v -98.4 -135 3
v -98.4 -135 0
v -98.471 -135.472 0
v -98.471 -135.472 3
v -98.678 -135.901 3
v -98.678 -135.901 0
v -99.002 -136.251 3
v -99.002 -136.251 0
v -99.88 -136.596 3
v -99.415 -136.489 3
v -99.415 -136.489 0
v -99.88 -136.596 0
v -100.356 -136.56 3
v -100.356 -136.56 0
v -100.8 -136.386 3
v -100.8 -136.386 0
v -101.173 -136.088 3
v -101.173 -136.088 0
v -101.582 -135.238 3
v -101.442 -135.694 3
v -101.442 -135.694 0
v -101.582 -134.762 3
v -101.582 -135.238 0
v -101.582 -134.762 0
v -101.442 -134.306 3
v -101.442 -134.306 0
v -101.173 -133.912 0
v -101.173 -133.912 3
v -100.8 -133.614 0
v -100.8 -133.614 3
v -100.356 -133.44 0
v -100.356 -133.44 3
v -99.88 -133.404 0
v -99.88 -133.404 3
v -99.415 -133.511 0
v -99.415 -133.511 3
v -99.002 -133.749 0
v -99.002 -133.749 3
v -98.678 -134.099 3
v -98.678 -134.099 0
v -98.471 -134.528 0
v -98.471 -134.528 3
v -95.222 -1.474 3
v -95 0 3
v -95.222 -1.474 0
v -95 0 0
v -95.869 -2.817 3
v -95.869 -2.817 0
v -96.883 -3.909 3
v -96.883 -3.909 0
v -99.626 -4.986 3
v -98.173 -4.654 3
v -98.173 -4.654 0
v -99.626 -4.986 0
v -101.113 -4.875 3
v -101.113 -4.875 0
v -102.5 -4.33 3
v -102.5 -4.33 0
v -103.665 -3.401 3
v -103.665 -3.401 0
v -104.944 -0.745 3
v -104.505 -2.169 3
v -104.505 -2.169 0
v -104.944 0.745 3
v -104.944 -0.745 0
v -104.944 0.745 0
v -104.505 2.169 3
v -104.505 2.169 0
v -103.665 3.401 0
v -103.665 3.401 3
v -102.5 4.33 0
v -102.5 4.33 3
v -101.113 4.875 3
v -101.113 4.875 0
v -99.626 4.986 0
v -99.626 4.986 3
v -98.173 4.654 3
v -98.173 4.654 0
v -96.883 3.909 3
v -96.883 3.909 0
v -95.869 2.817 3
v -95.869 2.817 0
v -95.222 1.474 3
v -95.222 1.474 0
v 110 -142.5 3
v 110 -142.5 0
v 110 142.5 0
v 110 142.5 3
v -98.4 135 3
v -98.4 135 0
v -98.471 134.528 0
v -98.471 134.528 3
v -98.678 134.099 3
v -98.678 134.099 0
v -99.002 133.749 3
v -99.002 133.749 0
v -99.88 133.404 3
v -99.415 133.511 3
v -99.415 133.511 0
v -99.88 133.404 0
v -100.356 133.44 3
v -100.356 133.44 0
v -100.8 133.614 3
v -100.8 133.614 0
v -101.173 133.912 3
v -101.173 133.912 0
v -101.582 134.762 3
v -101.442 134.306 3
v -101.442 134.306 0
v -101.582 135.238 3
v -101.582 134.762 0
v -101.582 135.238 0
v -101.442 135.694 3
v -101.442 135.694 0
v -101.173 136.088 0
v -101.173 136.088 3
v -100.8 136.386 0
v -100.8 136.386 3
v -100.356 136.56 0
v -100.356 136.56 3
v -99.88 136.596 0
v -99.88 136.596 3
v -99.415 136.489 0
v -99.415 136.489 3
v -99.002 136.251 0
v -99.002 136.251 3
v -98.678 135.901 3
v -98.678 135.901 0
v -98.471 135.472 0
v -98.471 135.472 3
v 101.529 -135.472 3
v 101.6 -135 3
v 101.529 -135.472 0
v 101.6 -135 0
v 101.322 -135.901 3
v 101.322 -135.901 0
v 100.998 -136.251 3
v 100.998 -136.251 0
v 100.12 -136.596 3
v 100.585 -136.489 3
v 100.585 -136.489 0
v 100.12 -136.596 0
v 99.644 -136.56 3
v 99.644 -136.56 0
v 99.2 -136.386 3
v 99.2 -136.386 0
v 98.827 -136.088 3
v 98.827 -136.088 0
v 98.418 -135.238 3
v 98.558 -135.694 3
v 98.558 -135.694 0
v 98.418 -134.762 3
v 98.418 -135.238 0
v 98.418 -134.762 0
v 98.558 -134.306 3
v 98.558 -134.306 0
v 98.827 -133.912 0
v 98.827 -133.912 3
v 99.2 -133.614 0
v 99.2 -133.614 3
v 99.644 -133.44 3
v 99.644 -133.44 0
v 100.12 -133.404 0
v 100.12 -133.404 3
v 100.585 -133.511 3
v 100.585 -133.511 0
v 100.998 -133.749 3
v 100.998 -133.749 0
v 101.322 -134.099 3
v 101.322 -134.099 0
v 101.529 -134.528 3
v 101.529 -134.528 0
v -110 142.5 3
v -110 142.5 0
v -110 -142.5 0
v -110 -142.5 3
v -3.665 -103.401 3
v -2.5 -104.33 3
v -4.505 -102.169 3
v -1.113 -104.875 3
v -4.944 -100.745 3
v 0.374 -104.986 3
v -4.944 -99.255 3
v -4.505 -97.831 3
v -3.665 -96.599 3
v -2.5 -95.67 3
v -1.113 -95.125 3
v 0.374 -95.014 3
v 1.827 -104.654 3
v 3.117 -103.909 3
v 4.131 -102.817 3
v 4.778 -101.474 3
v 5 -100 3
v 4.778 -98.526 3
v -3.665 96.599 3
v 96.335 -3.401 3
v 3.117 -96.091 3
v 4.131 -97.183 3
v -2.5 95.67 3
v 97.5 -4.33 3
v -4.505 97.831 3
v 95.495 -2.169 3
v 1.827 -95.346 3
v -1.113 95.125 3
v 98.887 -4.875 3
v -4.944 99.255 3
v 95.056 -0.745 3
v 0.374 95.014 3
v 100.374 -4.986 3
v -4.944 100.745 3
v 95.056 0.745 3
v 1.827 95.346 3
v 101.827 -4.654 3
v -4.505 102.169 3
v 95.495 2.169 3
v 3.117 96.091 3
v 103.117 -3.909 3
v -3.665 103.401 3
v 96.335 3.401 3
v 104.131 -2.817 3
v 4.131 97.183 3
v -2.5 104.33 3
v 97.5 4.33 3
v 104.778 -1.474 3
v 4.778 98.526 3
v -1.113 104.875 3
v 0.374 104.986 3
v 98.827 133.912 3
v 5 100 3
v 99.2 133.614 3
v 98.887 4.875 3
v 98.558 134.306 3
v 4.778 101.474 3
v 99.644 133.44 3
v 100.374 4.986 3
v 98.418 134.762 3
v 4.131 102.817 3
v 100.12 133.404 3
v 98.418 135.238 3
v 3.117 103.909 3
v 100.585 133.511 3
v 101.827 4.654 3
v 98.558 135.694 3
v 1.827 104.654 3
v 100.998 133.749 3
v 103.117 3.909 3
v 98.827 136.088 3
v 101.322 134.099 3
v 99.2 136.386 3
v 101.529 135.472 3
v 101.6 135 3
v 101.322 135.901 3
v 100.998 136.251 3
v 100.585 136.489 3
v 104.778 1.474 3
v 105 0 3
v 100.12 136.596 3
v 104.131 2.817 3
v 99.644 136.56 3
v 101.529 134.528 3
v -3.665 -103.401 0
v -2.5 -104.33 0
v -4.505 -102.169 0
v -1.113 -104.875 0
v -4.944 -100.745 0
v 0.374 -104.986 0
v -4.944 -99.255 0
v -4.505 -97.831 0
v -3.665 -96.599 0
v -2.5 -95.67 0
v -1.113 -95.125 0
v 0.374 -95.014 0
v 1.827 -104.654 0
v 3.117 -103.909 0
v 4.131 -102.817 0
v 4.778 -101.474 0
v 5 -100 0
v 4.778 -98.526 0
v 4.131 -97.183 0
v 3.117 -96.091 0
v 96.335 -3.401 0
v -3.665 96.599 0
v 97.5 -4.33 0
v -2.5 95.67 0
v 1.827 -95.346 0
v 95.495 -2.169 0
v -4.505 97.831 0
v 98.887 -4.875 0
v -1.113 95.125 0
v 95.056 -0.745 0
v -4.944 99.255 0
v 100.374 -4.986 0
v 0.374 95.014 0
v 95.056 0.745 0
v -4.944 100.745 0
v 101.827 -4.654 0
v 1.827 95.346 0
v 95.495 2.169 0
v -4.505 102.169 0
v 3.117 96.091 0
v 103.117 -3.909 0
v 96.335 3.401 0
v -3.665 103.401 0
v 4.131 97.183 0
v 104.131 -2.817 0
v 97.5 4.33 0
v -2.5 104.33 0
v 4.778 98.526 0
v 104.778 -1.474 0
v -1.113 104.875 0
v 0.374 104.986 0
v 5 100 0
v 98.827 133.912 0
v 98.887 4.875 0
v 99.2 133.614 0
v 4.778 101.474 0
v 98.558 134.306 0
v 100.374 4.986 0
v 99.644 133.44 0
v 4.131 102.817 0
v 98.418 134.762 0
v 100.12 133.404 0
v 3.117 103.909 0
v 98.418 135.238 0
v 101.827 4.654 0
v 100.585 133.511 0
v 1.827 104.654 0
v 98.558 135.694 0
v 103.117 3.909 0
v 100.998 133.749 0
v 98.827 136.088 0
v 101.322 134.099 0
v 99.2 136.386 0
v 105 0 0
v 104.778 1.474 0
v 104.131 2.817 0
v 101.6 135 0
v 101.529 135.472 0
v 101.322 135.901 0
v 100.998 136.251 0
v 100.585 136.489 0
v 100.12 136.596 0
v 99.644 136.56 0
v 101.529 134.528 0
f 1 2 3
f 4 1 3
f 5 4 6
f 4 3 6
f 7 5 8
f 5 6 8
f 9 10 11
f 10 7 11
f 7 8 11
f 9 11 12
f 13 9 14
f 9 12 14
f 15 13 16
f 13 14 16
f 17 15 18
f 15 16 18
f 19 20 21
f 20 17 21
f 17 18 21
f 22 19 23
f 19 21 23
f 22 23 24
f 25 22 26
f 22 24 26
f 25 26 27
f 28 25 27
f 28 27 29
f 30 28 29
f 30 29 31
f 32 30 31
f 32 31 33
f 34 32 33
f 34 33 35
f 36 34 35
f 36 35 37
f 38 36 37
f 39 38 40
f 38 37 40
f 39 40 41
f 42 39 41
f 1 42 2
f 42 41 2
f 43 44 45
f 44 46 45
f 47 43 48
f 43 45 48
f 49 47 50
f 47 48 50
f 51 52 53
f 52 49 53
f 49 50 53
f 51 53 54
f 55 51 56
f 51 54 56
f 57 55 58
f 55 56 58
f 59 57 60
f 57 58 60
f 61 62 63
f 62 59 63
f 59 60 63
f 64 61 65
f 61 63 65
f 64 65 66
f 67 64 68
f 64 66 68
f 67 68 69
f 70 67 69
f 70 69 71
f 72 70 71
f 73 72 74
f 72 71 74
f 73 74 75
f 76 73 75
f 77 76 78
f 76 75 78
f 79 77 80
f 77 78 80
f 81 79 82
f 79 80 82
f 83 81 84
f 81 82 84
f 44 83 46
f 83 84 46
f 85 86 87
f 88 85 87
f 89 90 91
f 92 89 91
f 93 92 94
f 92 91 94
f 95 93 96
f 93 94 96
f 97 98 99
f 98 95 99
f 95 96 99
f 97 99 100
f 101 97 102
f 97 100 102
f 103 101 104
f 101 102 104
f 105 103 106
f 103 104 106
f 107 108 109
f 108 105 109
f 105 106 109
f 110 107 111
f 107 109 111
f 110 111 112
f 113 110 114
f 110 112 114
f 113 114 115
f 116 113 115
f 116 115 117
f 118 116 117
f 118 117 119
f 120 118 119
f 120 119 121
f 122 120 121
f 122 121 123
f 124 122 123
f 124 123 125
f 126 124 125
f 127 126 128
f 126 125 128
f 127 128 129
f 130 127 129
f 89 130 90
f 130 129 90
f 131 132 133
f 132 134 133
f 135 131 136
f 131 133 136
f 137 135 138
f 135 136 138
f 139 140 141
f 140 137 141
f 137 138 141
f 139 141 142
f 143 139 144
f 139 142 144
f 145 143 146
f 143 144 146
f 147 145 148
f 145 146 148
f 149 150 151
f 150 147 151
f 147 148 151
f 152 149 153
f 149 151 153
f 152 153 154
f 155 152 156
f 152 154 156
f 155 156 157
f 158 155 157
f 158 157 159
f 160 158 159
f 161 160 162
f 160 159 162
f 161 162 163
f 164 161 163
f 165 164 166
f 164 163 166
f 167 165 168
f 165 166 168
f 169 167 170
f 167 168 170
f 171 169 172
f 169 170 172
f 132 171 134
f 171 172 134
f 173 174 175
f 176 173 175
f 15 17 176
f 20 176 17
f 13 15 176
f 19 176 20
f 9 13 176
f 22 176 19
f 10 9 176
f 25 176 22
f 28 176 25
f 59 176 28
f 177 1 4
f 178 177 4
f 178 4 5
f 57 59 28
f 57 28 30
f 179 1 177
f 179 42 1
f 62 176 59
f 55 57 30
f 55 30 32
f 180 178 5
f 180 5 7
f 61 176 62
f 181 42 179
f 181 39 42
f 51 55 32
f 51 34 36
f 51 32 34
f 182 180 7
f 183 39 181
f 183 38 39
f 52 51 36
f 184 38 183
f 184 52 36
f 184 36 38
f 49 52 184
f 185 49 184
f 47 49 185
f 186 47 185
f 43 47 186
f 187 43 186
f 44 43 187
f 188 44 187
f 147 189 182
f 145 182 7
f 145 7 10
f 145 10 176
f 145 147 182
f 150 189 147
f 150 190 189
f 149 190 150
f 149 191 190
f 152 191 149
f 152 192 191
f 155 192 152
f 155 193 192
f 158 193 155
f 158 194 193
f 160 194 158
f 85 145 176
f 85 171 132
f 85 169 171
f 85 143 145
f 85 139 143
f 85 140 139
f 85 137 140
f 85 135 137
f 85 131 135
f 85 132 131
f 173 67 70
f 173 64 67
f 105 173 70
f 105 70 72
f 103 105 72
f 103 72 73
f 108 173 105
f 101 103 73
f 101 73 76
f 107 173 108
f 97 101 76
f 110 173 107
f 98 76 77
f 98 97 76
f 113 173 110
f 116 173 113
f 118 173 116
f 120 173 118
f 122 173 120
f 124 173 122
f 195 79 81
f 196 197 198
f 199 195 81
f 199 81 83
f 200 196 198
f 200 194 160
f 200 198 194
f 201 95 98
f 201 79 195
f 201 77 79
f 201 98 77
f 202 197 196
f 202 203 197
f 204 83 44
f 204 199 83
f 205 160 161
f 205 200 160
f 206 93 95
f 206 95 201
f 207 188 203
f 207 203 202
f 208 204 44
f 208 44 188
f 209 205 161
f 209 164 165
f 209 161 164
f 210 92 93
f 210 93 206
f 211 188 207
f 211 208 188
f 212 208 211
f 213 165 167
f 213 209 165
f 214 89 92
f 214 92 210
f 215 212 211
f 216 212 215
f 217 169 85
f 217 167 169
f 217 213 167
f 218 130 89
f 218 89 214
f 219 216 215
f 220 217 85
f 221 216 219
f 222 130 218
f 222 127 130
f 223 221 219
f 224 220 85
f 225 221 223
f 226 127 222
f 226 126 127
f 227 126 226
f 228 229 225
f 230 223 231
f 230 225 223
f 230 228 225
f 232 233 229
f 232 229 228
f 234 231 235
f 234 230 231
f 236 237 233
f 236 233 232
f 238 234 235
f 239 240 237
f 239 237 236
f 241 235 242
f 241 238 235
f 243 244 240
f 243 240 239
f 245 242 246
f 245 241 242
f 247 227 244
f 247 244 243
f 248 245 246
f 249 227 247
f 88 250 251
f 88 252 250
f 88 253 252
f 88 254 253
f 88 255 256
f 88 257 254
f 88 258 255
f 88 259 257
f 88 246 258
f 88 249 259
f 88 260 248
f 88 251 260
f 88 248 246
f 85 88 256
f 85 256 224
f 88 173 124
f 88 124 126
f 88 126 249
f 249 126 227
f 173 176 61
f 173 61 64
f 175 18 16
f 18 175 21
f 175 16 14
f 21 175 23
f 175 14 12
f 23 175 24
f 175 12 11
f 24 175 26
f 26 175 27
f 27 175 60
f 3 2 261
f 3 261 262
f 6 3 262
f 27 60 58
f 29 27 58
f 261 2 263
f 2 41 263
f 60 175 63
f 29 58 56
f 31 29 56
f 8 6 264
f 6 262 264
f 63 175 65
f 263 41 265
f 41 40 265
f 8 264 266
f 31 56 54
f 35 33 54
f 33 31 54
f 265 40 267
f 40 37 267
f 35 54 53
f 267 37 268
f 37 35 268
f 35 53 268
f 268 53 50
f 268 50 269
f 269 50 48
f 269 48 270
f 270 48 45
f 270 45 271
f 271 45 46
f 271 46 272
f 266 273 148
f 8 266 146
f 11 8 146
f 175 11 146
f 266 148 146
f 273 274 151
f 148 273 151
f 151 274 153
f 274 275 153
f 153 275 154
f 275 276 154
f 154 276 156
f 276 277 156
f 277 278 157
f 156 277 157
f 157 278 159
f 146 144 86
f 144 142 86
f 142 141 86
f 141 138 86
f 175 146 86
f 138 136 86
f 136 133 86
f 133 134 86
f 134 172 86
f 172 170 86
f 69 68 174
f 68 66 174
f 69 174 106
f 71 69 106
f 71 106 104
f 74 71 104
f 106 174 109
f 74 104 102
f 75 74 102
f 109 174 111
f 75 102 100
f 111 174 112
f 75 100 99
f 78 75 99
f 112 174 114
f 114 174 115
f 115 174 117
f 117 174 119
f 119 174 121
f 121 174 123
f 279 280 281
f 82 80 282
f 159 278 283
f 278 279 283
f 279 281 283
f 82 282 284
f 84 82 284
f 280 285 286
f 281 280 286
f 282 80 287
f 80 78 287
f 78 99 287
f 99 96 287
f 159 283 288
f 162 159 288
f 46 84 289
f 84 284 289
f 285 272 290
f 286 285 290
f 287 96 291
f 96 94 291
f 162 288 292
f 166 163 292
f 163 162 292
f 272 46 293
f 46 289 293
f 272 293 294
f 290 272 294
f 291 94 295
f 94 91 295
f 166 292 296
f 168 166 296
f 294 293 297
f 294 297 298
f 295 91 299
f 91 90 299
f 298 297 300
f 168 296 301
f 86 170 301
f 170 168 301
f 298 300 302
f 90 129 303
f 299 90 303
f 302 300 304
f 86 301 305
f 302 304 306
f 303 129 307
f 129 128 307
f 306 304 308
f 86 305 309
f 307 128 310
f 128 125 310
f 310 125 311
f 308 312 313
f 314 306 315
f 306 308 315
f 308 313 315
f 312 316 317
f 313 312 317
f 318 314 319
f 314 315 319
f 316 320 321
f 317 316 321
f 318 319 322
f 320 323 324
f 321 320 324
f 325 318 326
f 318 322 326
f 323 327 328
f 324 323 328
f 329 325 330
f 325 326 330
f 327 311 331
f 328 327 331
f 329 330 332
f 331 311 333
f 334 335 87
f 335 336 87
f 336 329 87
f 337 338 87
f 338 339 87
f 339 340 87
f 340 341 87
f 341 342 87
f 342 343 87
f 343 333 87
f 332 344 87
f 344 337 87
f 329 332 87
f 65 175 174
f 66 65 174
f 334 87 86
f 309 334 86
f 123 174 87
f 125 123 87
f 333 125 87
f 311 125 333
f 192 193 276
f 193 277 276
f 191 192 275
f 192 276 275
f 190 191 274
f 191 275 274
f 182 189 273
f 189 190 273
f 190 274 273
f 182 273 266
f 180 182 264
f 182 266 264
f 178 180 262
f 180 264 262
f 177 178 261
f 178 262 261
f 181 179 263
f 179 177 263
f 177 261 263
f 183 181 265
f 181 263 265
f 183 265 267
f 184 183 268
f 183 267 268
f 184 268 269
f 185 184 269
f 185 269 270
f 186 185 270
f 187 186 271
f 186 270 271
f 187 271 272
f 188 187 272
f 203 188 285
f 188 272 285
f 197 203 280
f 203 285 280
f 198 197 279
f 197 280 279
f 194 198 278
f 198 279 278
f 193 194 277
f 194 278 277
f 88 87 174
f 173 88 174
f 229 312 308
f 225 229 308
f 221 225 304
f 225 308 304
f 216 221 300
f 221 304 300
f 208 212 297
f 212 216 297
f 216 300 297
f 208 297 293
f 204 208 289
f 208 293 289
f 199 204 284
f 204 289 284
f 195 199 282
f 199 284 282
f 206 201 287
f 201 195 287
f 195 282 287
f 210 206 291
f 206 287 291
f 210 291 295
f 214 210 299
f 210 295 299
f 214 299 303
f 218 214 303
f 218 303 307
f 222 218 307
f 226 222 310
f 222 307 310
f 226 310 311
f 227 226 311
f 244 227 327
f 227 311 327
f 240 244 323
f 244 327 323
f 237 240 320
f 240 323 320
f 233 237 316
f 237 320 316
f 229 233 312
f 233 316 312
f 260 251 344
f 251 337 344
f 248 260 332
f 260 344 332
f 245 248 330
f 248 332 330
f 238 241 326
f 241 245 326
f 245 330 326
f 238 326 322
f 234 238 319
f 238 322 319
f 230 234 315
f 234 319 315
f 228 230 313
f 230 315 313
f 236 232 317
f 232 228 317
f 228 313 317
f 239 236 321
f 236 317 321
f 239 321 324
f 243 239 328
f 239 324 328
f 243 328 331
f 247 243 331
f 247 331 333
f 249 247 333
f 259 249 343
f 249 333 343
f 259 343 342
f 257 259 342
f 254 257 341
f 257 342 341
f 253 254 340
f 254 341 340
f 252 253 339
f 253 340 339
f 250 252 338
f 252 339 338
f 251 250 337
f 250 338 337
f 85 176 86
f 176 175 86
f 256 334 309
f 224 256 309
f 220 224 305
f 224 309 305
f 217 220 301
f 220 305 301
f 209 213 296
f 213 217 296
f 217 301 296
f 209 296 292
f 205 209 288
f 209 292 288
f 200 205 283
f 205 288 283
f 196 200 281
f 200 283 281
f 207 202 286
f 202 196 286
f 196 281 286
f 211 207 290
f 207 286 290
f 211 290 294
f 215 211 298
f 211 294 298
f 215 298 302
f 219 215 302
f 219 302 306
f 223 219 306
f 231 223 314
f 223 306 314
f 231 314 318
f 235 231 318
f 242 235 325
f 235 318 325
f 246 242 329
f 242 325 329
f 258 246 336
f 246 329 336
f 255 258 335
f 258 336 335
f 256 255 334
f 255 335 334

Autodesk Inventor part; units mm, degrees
ref_plane "YZ Plane" through (0, 0, 0) normal (1, 0, 0) x (0, 1, 0)
ref_plane "XZ Plane" through (0, 0, 0) normal (0, 1, 0) x (-1, 0, 0)
ref_plane "XY Plane" through (0, 0, 0) normal (0, 0, 1) x (1, 0, 0)
sketch "スケッチ1" plane through (0, 0, 0) normal (0, 0, 1) x (1, 0, 0)
  line L0 (0, 100) -> (-100, 0) construction
  line L1 (-100, 0) -> (0, -100) construction
  line L2 (0, -100) -> (100, 0) construction
  line L3 (100, 0) -> (0, 100) construction
  line L4 (0, 100) -> (0, -100) construction
  line L5 (-100, 0) -> (100, 0) construction
  line L6 (100, 135) -> (-100, 135) construction
  line L7 (-100, 135) -> (-100, -135) construction
  line L8 (-100, -135) -> (100, -135) construction
  line L9 (100, -135) -> (100, 135) construction
  line L10 (100, 135) -> (-100, -135) construction
  line L11 (-100, 135) -> (100, -135) construction
  circle A0 centre (-100, 135) radius 1.6
  circle A1 centre (100, 135) radius 1.6
  circle A2 centre (100, -135) radius 1.6
  circle A3 centre (-100, -135) radius 1.6
  circle A4 centre (-100, 0) radius 5
  circle A5 centre (0, 100) radius 5
  circle A6 centre (100, 0) radius 5
  circle A7 centre (0, -100) radius 5
  line L12 (110, 142.5) -> (-110, 142.5)
  line L13 (-110, 142.5) -> (-110, -142.5)
  line L14 (-110, -142.5) -> (110, -142.5)
  line L15 (110, -142.5) -> (110, 142.5)
  line L16 (110, 142.5) -> (-110, -142.5) construction
  line L17 (-110, 142.5) -> (110, -142.5) construction
  point P0 (0, 0)
  point P1 (0, 0)
  dimension "d2" = 200
  dimension "d3" = 270
  dimension "d4" = 3.2
  dimension "d5" = 3.2
  dimension "d6" = 3.2
  dimension "d7" = 3.2
  dimension "d8" = 10
  dimension "d9" = 10
  dimension "d10" = 10
  dimension "d11" = 10
  dimension "d12" = 7.5
  dimension "d19" = 200
  dimension "d20" = 10
extrude "押し出し1" add sketch "スケッチ1" along normal blind 3
properties part number "プレート保持_いた"
